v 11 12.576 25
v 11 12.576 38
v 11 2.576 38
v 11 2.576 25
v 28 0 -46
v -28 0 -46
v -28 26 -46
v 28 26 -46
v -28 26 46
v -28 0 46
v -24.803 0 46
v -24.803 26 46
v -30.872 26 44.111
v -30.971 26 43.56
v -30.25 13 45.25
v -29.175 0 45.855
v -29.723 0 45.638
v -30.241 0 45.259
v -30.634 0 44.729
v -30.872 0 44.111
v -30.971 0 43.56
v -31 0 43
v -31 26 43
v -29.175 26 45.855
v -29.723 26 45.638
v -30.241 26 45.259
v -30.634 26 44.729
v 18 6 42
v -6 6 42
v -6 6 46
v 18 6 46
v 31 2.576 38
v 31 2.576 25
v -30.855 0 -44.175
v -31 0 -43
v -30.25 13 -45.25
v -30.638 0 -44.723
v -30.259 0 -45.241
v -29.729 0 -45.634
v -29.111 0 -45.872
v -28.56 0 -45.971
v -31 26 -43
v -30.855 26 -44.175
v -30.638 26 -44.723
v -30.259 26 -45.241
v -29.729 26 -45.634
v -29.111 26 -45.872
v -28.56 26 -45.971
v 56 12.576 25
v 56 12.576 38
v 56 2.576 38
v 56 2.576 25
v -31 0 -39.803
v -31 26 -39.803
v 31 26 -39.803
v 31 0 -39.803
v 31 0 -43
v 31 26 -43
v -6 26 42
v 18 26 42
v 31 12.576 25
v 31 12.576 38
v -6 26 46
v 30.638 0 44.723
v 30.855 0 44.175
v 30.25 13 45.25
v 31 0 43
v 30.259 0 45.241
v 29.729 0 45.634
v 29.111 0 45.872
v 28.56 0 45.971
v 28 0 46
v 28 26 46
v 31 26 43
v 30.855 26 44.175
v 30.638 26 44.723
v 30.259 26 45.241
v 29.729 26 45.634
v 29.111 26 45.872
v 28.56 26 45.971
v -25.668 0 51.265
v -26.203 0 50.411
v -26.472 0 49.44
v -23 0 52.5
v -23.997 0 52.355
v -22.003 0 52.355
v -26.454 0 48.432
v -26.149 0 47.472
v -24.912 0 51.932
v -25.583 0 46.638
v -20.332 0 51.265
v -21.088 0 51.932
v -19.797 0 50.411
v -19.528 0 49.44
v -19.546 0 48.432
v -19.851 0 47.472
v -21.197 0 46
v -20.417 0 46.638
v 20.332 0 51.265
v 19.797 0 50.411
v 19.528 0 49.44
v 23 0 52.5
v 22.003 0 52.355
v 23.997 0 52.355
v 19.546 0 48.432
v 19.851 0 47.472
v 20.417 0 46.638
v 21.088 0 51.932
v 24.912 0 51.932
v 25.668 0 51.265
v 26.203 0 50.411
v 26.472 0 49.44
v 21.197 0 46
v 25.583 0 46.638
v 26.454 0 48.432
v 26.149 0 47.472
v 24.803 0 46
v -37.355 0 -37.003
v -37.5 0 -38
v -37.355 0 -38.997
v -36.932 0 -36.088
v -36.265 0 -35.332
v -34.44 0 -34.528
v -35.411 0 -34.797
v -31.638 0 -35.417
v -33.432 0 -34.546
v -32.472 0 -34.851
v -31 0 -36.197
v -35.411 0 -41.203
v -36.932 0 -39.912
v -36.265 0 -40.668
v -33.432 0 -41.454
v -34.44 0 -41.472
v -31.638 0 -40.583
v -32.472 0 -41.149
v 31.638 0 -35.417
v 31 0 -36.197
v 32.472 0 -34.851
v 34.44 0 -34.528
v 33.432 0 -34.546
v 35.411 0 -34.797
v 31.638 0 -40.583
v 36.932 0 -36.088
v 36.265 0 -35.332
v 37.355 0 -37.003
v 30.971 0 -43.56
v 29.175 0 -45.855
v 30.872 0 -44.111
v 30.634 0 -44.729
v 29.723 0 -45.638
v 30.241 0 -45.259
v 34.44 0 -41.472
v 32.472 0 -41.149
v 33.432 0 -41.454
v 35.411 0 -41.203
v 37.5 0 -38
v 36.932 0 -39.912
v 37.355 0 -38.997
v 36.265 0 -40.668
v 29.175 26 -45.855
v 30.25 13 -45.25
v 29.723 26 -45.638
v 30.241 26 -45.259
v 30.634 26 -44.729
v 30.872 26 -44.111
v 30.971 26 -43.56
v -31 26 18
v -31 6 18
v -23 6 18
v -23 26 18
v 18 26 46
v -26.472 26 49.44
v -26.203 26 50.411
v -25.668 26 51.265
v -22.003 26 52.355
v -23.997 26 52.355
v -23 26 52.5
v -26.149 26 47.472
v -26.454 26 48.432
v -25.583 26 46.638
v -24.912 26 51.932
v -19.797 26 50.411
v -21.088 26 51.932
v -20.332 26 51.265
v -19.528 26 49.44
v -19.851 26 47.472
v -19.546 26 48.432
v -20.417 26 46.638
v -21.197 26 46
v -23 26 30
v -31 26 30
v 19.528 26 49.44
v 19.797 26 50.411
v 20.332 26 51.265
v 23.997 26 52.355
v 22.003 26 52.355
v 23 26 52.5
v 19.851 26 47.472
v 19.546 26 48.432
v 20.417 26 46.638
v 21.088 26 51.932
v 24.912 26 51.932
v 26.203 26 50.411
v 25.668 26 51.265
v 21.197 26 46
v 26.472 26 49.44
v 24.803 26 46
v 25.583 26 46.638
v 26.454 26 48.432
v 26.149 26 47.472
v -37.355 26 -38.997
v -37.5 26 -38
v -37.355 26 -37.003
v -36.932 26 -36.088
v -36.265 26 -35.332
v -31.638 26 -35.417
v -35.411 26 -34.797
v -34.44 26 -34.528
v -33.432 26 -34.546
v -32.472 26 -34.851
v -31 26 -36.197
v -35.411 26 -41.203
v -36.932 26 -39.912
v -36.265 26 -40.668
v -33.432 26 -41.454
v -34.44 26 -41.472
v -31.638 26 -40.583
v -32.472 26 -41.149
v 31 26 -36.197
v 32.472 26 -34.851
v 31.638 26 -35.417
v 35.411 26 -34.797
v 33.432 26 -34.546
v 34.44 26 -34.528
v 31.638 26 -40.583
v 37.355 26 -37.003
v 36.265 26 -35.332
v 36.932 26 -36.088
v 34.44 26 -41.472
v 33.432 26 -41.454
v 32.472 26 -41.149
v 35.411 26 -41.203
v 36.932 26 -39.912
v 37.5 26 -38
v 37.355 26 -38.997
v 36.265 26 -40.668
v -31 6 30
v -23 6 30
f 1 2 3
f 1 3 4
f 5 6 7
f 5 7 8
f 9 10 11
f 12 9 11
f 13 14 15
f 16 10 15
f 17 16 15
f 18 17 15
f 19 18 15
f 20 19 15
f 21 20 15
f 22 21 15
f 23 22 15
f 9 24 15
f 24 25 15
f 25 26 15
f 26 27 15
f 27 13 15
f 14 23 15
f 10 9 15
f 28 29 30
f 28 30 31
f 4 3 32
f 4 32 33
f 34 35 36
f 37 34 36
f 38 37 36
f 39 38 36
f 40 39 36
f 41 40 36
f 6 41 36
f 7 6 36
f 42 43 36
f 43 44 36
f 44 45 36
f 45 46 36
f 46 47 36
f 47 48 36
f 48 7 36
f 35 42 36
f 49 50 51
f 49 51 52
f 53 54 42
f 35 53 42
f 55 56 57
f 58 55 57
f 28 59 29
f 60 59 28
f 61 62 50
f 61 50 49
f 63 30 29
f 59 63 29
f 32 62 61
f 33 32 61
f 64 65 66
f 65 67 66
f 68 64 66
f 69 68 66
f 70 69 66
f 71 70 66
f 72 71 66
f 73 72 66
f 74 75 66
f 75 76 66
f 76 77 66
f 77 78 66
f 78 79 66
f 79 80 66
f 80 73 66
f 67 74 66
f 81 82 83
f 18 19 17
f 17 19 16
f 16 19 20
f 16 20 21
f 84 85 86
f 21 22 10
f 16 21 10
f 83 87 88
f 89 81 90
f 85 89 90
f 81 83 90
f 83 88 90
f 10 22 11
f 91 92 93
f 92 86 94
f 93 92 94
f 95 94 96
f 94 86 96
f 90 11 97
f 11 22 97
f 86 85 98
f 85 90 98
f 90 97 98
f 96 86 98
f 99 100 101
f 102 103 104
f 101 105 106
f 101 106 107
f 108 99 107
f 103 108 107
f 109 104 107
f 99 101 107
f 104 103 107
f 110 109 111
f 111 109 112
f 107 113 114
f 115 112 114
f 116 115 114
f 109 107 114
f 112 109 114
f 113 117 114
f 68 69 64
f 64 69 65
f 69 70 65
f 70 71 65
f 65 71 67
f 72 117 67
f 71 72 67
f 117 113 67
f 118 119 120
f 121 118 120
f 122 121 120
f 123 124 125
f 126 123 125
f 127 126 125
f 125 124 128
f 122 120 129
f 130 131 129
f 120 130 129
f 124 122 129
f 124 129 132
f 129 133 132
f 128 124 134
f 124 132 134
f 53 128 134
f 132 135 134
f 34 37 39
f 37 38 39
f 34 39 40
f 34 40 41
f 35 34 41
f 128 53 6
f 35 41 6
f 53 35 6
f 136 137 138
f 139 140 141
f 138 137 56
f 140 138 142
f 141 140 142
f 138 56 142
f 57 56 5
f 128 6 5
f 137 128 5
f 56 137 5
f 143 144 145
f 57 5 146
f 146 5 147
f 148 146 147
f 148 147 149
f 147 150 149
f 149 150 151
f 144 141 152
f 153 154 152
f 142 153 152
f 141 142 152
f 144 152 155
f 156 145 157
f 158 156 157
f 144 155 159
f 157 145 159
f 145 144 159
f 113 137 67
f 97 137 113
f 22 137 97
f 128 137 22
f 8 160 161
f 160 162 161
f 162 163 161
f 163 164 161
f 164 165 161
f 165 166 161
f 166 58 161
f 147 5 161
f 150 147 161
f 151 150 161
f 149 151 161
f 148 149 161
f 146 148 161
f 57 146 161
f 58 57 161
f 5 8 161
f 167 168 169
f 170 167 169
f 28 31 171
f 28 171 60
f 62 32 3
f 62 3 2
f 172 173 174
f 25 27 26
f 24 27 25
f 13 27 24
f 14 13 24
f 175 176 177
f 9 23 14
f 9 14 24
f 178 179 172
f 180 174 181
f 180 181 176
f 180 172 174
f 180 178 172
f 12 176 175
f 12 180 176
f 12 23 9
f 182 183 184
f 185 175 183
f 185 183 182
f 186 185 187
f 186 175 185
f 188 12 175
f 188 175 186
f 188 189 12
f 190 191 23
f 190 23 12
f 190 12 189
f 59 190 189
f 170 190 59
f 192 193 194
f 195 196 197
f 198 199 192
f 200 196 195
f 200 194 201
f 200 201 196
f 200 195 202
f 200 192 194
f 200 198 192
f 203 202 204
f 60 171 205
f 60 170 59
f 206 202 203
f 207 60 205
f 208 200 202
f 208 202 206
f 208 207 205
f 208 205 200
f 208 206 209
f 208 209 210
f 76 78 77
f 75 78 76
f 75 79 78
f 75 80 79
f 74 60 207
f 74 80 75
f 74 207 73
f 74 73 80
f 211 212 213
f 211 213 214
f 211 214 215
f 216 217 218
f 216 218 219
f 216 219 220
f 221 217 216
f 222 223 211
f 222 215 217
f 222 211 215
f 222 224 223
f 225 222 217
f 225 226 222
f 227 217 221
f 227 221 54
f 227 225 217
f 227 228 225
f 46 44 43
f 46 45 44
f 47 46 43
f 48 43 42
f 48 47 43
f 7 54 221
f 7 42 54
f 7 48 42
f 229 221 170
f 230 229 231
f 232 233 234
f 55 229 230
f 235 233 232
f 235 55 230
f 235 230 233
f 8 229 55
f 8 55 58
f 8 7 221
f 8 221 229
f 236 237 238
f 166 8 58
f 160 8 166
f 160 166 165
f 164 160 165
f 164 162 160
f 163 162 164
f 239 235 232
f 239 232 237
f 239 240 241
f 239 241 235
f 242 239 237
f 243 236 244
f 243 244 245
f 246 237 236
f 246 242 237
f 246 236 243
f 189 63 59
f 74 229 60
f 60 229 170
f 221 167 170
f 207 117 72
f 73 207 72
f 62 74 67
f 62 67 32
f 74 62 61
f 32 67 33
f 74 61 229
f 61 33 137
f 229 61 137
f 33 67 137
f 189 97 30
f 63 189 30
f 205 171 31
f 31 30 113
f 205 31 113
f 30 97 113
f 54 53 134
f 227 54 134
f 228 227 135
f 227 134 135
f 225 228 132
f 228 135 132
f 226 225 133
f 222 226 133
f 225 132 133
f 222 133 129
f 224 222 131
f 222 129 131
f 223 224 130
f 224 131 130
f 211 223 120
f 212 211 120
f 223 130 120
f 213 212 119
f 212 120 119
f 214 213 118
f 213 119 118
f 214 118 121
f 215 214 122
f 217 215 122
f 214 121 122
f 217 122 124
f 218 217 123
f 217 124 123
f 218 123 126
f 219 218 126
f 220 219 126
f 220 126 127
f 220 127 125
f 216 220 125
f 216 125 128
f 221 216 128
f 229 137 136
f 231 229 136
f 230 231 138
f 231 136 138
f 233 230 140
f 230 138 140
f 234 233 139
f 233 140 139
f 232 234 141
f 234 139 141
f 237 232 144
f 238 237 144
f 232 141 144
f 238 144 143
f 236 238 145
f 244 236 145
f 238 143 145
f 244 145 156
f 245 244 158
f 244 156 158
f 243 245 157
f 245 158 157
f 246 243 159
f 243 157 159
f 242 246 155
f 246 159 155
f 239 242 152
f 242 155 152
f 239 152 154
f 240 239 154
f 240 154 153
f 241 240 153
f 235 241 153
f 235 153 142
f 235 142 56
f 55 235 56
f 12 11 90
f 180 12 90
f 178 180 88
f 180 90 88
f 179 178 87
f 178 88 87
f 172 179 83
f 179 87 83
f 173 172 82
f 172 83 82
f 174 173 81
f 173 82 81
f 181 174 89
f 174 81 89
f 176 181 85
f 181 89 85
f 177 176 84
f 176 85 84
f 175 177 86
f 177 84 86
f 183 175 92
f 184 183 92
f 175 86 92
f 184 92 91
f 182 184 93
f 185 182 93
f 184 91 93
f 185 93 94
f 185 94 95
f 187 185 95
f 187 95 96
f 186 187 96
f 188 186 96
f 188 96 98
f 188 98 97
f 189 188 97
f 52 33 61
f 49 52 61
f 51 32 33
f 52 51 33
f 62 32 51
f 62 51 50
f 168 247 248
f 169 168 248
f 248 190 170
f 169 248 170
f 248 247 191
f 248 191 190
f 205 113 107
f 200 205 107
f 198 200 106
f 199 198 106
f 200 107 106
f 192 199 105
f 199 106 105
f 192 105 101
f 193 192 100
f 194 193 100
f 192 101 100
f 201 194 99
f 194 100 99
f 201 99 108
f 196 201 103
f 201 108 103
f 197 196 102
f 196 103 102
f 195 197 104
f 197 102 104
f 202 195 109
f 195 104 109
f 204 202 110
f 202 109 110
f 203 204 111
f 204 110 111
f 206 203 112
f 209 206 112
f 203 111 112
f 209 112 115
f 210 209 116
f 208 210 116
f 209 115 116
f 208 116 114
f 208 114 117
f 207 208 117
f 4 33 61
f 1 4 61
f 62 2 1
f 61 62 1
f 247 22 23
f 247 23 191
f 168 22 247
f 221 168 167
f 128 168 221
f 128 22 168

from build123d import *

# Parameters (mm, degrees)
CROQUIS1_R              = 3.5
CROQUIS1_W              = 62
CROQUIS1_H              = 92
SALIENTE_EXTRUIR1_DEPTH = 26
REDONDEO1_SIZE          = 3
CROQUIS2_W              = 13
CROQUIS2_H              = 10
CORTAR_EXTRUIR1_DEPTH   = 20
CROQUIS3_W              = 8
CROQUIS3_H              = 12
CORTAR_EXTRUIR2_DEPTH   = 20
CROQUIS4_W              = 24
CROQUIS4_H              = 4
CORTAR_EXTRUIR3_DEPTH   = 20
CROQUIS5_W              = 13
CROQUIS5_H              = 10
SALIENTE_EXTRUIR2_DEPTH = 25


with BuildPart() as part:
    # Croquis1 → Saliente-Extruir1 (new body)
    with BuildSketch(Plane(origin=(0, 0, 0), x_dir=(1, 0, 0), z_dir=(0, 1, 0))):
        with Locations((-23, -49)):
            Circle(CROQUIS1_R)
        with Locations((23, -49)):
            Circle(CROQUIS1_R)
        with Locations((34, 38)):
            Circle(CROQUIS1_R)
        with Locations((-34, 38)):
            Circle(CROQUIS1_R)
        Rectangle(CROQUIS1_W, CROQUIS1_H)
        with BuildLine():
            ThreePointArc((-21.197224362, -46), (-23, -45.5), (-24.802775638, -46))
            Line((-24.802775638, -46), (-21.197224362, -46))
        make_face()
        with BuildLine():
            Line((-21.197224362, -46), (-24.802775638, -46))
            ThreePointArc((-24.802775638, -46), (-24.723410176, -52.046285831), (-19.5, -49))
            ThreePointArc((-19.5, -49), (-19.953714169, -47.276589824), (-21.197224362, -46))
        make_face()
    extrude(amount=SALIENTE_EXTRUIR1_DEPTH)

    # Redondeo1
    # a fillet whose section is not a circle: 3 mm, written as the material it takes off along each edge
    with BuildSketch(Plane(origin=(31, -7.5, 46), x_dir=(-1, 0, 0), z_dir=(0, 1, 0)), Plane(origin=(-31, -7.5, 46), x_dir=(0, 0, -1), z_dir=(0, 1, 0)), Plane(origin=(-31, -7.5, -46), x_dir=(1, 0, 0), z_dir=(0, 1, 0)), Plane(origin=(31, -7.5, -46), x_dir=(0, 0, 1), z_dir=(0, 1, 0))) as redondeo1_piece_1:
        with BuildLine():
            Bezier((REDONDEO1_SIZE, 0), (0, 0), (0, -REDONDEO1_SIZE), weights=[1, 1, 1])
            Line((0, -REDONDEO1_SIZE), (0, 0))
            Line((0, 0), (REDONDEO1_SIZE, 0))
        make_face()
    extrude(amount=41, mode=Mode.SUBTRACT)

    # Croquis2 → Cortar-Extruir1 (cut)
    with BuildSketch(Plane(origin=(31, 0, 0), x_dir=(0, 0, -1), z_dir=(1, 0, 0))):
        with Locations((-31.5, 7.575724176)):
            Rectangle(CROQUIS2_W, CROQUIS2_H)
    extrude(amount=-CORTAR_EXTRUIR1_DEPTH, mode=Mode.SUBTRACT)

    # Croquis3 → Cortar-Extruir2 (cut)
    with BuildSketch(Plane(origin=(0, 26, 0), x_dir=(1, 0, 0), z_dir=(0, 1, 0))):
        with Locations((-27, -24)):
            Rectangle(CROQUIS3_W, CROQUIS3_H)
    extrude(amount=-CORTAR_EXTRUIR2_DEPTH, mode=Mode.SUBTRACT)

    # Croquis4 → Cortar-Extruir3 (cut)
    with BuildSketch(Plane(origin=(0, 26, 0), x_dir=(1, 0, 0), z_dir=(0, 1, 0))):
        with Locations((6, -44)):
            Rectangle(CROQUIS4_W, CROQUIS4_H)
    extrude(amount=-CORTAR_EXTRUIR3_DEPTH, mode=Mode.SUBTRACT)


with BuildPart() as body_2:
    # Croquis5 → Saliente-Extruir2 (new body)
    with BuildSketch(Plane(origin=(31, 0, 0), x_dir=(0, 0, -1), z_dir=(1, 0, 0))):
        with Locations((-31.5, 7.575724176)):
            Rectangle(CROQUIS5_W, CROQUIS5_H)
    extrude(amount=SALIENTE_EXTRUIR2_DEPTH)


solid = Compound([part.part, body_2.part])
